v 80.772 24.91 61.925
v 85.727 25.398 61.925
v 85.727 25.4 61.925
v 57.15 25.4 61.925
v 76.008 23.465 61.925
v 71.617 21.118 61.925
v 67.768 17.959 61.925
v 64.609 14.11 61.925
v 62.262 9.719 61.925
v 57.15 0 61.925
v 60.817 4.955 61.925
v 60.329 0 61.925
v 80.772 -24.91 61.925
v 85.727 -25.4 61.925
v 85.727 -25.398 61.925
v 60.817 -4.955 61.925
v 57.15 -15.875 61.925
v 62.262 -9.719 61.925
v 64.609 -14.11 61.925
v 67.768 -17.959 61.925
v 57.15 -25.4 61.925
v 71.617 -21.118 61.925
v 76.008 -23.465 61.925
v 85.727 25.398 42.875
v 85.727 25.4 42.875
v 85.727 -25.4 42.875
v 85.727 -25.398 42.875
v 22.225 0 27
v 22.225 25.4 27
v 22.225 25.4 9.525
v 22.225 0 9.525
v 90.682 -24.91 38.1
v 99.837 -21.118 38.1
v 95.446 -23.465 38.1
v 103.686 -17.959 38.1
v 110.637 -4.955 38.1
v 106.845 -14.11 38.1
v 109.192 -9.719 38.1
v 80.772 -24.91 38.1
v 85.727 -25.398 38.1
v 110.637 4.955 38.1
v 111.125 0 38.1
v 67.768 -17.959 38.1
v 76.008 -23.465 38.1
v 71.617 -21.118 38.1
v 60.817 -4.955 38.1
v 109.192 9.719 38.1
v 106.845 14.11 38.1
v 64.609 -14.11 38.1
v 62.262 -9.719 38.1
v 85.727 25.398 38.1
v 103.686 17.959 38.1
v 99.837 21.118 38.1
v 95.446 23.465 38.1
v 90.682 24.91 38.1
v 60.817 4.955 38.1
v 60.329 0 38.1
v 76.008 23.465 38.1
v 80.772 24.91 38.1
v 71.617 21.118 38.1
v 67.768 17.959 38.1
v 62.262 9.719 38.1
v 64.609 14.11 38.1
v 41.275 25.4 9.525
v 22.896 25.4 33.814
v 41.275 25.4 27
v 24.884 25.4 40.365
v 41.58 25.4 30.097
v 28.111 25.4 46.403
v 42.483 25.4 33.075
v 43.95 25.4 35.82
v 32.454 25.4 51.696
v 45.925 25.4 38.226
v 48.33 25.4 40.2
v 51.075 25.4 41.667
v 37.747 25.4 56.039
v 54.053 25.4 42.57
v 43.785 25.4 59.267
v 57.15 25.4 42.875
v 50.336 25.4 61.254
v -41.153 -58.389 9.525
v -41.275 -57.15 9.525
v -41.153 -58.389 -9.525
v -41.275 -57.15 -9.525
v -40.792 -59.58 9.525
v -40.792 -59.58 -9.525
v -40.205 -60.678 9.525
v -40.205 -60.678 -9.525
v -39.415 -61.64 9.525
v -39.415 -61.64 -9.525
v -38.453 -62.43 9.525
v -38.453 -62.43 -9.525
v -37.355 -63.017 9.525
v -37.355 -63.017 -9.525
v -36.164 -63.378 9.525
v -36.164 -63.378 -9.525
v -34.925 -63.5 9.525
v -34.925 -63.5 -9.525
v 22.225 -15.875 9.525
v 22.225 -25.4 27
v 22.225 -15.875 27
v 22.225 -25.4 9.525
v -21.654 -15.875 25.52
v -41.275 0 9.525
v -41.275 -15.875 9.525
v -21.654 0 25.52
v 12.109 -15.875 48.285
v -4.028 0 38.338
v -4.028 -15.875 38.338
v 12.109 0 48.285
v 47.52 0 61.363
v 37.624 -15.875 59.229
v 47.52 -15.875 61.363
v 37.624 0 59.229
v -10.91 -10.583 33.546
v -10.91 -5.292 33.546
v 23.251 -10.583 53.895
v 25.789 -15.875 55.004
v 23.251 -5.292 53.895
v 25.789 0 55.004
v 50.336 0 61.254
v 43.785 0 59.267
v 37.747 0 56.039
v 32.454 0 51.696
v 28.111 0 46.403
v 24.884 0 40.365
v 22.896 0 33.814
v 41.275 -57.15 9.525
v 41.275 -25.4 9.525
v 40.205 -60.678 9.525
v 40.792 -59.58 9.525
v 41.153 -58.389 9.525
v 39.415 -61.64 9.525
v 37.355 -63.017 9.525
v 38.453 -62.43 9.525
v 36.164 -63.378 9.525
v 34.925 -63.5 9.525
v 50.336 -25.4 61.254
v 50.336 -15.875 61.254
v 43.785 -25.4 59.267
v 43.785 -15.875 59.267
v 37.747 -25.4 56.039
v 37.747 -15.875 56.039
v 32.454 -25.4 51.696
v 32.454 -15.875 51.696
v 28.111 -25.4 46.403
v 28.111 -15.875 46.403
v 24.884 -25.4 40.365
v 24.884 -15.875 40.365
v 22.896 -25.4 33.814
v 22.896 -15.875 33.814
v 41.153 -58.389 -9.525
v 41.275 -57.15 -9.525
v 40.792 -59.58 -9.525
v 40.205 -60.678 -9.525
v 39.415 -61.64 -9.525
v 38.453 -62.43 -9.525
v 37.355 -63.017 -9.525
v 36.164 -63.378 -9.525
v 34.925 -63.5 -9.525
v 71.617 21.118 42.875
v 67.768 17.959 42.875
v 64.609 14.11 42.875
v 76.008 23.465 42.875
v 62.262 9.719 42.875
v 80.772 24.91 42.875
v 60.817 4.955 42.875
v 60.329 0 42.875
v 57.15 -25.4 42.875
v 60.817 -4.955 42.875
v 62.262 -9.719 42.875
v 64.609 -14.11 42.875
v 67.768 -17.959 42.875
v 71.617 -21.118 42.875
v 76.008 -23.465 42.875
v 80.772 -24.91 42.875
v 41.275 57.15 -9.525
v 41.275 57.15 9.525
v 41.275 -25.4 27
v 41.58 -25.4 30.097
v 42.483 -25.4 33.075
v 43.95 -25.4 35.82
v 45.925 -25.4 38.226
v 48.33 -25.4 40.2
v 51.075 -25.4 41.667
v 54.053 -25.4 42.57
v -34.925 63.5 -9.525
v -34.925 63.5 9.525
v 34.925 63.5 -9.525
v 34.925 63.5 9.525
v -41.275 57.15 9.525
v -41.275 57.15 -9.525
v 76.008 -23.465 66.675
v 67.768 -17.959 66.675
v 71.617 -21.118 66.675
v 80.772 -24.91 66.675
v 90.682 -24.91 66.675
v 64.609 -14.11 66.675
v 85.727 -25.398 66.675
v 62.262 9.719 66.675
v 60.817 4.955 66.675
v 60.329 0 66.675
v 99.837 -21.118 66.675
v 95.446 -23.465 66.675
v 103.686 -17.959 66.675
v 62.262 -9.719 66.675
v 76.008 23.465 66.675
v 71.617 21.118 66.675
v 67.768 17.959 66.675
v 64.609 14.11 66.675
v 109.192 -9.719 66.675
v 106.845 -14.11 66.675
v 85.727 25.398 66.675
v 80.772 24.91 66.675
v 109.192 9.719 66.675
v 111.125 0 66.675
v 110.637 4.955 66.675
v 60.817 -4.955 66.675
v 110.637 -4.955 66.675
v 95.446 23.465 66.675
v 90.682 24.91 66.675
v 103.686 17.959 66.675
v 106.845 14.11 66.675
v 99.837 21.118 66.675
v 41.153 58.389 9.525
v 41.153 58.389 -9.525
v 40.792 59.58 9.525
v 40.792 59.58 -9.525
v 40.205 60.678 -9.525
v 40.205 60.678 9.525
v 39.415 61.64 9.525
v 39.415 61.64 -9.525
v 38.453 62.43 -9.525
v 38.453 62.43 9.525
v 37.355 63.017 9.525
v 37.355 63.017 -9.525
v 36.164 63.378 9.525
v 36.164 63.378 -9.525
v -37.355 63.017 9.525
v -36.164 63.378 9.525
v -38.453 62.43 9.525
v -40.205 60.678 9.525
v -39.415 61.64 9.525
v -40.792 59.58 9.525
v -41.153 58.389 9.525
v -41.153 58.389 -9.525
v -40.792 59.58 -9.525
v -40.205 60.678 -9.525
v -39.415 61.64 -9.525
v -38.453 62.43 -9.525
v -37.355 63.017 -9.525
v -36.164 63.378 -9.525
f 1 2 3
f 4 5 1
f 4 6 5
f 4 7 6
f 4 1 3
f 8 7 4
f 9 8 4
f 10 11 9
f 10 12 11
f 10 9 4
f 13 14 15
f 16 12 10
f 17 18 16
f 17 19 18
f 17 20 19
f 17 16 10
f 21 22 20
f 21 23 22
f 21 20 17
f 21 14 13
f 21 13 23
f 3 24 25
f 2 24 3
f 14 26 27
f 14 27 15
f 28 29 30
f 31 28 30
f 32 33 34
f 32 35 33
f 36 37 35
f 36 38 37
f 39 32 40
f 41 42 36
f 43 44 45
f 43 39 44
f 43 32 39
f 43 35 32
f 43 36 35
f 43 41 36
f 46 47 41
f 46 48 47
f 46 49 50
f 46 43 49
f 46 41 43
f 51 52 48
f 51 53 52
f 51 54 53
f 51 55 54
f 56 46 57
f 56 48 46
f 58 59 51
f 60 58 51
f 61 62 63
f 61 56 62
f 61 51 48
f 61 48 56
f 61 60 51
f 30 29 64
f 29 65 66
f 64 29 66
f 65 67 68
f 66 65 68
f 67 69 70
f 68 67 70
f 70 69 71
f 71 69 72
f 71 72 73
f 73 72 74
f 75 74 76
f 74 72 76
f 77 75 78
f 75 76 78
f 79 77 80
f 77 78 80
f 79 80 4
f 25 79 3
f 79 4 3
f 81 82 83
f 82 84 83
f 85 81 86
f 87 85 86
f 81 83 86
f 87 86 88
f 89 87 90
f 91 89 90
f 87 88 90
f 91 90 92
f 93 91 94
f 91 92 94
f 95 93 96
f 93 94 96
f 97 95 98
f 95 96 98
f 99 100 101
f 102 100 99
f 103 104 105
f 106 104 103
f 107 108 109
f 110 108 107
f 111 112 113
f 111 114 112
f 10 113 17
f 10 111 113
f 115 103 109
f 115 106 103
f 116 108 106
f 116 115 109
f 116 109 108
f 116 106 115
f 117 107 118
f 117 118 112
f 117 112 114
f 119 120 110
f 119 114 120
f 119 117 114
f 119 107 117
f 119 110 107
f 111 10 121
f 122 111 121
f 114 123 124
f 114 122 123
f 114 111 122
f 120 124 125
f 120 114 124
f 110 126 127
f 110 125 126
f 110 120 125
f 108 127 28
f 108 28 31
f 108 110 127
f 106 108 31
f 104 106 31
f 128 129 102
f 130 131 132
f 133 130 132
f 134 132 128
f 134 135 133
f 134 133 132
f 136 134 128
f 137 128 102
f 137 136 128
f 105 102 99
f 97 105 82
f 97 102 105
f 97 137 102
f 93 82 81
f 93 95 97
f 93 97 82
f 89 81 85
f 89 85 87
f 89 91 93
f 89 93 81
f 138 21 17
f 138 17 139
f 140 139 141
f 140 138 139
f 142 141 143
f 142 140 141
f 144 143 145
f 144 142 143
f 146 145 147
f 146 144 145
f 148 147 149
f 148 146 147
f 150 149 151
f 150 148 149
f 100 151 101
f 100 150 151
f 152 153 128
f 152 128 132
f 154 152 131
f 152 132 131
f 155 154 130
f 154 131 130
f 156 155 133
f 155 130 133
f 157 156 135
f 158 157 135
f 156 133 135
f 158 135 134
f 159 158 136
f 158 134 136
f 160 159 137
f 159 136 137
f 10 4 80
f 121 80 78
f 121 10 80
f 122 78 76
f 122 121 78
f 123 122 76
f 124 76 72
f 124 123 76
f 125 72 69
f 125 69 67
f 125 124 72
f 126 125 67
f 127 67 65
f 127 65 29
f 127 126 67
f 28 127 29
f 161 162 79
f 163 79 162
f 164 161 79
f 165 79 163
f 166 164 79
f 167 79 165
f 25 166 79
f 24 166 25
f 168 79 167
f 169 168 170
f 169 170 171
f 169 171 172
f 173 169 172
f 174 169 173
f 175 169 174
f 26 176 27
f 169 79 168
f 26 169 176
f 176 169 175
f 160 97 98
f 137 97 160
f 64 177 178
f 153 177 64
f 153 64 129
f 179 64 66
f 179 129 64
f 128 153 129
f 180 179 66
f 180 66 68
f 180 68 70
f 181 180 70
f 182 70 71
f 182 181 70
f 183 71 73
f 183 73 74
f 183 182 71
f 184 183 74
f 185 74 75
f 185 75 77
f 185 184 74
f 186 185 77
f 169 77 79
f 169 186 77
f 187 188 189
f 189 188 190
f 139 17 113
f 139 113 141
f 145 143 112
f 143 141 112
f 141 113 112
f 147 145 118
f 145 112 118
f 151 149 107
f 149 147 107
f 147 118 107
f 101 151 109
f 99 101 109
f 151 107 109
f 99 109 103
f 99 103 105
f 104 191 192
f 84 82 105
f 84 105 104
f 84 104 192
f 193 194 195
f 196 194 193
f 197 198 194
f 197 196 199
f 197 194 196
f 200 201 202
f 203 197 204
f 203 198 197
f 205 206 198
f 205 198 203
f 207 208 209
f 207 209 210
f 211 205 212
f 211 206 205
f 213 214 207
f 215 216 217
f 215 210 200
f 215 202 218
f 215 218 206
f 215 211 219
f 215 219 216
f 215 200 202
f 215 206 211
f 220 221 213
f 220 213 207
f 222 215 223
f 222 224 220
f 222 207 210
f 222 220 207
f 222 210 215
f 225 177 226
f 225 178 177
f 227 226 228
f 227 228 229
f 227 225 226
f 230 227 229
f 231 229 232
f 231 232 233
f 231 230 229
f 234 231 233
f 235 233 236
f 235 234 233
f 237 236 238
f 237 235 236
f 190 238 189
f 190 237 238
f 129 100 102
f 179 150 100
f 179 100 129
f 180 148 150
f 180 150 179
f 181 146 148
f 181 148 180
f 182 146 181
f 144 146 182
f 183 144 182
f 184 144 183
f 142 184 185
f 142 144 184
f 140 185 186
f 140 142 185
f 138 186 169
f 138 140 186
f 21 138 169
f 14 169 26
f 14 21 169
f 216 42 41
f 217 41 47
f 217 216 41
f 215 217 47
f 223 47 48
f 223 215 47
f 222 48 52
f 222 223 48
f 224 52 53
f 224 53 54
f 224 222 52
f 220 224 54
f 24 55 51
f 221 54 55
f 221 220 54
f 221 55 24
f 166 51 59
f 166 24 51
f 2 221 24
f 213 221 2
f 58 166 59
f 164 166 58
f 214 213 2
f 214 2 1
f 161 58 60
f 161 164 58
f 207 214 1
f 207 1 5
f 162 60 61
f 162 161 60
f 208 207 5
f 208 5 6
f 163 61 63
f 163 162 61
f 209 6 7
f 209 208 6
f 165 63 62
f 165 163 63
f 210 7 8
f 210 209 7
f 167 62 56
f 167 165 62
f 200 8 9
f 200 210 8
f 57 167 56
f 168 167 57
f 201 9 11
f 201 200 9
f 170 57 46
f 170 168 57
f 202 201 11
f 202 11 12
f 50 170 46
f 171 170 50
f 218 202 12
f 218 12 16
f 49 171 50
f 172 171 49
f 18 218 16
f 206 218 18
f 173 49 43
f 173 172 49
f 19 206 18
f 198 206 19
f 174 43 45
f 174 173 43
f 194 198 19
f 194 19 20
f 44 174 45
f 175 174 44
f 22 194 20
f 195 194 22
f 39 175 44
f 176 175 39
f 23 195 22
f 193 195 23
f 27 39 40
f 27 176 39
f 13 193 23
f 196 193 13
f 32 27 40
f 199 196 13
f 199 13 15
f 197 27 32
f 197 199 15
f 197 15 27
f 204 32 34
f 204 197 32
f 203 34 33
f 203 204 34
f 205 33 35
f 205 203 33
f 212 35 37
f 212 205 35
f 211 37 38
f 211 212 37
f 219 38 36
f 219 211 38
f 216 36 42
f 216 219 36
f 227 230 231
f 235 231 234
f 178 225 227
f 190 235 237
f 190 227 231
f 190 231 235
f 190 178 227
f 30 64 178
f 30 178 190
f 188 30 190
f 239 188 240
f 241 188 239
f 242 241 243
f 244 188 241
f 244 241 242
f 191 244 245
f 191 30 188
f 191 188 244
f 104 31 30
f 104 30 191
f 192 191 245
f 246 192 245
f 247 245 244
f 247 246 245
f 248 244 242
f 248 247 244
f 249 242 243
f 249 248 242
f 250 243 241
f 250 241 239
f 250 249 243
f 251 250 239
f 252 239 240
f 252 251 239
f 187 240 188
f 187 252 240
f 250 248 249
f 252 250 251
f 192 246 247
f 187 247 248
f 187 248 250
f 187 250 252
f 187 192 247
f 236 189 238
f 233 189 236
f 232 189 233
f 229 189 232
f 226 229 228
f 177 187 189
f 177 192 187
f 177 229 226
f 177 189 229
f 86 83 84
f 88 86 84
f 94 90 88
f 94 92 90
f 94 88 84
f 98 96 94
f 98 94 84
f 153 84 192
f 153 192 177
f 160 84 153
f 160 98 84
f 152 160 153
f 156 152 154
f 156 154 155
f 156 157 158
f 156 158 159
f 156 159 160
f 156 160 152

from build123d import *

# Parameters (mm, degrees)
F1_DEPTH = 63.5
F0_W     = 25.402003606
F0_H     = 19.05
F2_DEPTH = 25.4
F3_DEPTH = 15.875
F5_R     = 6.35


with BuildPart() as f1:
    # F0 (on Front) → F1 (new body, symmetric)
    with BuildSketch(Plane.XZ):
        Polygon((22.225, 9.525), (-41.275, 9.525), (-41.275, -9.525), (41.275, -9.525), (41.275, 9.525), align=None)
    extrude(amount=F1_DEPTH, both=True)

    # F0 (on Front) → F2 (join, symmetric)
    with BuildSketch(Plane.XZ):
        with BuildLine():
            Line((22.225, 27.0002), (22.225, 9.525))
            Line((22.225, 9.525), (41.275, 9.525))
            Line((41.275, 9.525), (41.275, 27.0002))
            ThreePointArc((41.275, 27.0002), (45.9246798487, 38.2255201513), (57.15, 42.8752))
            Line((57.15, 42.8752), (60.325, 42.8752))
            Line((60.325, 42.8752), (60.325, 61.9252))
            Line((60.325, 61.9252), (57.15, 61.9252))
            ThreePointArc((57.15, 61.9252), (32.4542956671, 51.6959043329), (22.225, 27.0002))
        make_face()
        with Locations((73.026001803, 52.4002)):
            Rectangle(F0_W, F0_H)
    extrude(amount=F2_DEPTH, both=True)

    # F0 (on Front) → F3 (join)
    with BuildSketch(Plane.XZ):
        with BuildLine():
            add(Edge.make_bspline(
                [(-41.275, 9.525), (-14.1619439489, 32.5014305517), (24.7363013962, 62.9349157899), (57.15, 61.9252)],
                knots=[0, 0, 0, 0, 111.5045361635, 111.5045361635, 111.5045361635, 111.5045361635], degree=3))
            Line((-41.275, 9.525), (22.225, 9.525))
            Line((22.225, 9.525), (22.225, 27.0002))
            ThreePointArc((22.225, 27.0002), (32.4542956671, 51.6959043329), (57.15, 61.9252))
        make_face()
    extrude(amount=F3_DEPTH)

    # F0 (on Front) → F4 (revolve)
    with BuildSketch(Plane.XZ):
        Polygon((85.727003606, 66.675), (85.727003606, 61.9252), (85.727003606, 42.8752), (85.727003606, 38.1), (111.125, 38.1), (111.125, 66.675), align=None)
    revolve(axis=Axis((85.727003606, 0, 52.3875), (0, 0, 1)))

    # F5
    f5_edges = [f1.edges().sort_by_distance(p)[0] for p in [
        (41.275, -63.5, 0),
        (-41.275, -63.5, 0),
        (-41.275, 63.5, 0),
        (41.275, 63.5, 0),
    ]]
    fillet(f5_edges, radius=F5_R)


solid = f1.part
